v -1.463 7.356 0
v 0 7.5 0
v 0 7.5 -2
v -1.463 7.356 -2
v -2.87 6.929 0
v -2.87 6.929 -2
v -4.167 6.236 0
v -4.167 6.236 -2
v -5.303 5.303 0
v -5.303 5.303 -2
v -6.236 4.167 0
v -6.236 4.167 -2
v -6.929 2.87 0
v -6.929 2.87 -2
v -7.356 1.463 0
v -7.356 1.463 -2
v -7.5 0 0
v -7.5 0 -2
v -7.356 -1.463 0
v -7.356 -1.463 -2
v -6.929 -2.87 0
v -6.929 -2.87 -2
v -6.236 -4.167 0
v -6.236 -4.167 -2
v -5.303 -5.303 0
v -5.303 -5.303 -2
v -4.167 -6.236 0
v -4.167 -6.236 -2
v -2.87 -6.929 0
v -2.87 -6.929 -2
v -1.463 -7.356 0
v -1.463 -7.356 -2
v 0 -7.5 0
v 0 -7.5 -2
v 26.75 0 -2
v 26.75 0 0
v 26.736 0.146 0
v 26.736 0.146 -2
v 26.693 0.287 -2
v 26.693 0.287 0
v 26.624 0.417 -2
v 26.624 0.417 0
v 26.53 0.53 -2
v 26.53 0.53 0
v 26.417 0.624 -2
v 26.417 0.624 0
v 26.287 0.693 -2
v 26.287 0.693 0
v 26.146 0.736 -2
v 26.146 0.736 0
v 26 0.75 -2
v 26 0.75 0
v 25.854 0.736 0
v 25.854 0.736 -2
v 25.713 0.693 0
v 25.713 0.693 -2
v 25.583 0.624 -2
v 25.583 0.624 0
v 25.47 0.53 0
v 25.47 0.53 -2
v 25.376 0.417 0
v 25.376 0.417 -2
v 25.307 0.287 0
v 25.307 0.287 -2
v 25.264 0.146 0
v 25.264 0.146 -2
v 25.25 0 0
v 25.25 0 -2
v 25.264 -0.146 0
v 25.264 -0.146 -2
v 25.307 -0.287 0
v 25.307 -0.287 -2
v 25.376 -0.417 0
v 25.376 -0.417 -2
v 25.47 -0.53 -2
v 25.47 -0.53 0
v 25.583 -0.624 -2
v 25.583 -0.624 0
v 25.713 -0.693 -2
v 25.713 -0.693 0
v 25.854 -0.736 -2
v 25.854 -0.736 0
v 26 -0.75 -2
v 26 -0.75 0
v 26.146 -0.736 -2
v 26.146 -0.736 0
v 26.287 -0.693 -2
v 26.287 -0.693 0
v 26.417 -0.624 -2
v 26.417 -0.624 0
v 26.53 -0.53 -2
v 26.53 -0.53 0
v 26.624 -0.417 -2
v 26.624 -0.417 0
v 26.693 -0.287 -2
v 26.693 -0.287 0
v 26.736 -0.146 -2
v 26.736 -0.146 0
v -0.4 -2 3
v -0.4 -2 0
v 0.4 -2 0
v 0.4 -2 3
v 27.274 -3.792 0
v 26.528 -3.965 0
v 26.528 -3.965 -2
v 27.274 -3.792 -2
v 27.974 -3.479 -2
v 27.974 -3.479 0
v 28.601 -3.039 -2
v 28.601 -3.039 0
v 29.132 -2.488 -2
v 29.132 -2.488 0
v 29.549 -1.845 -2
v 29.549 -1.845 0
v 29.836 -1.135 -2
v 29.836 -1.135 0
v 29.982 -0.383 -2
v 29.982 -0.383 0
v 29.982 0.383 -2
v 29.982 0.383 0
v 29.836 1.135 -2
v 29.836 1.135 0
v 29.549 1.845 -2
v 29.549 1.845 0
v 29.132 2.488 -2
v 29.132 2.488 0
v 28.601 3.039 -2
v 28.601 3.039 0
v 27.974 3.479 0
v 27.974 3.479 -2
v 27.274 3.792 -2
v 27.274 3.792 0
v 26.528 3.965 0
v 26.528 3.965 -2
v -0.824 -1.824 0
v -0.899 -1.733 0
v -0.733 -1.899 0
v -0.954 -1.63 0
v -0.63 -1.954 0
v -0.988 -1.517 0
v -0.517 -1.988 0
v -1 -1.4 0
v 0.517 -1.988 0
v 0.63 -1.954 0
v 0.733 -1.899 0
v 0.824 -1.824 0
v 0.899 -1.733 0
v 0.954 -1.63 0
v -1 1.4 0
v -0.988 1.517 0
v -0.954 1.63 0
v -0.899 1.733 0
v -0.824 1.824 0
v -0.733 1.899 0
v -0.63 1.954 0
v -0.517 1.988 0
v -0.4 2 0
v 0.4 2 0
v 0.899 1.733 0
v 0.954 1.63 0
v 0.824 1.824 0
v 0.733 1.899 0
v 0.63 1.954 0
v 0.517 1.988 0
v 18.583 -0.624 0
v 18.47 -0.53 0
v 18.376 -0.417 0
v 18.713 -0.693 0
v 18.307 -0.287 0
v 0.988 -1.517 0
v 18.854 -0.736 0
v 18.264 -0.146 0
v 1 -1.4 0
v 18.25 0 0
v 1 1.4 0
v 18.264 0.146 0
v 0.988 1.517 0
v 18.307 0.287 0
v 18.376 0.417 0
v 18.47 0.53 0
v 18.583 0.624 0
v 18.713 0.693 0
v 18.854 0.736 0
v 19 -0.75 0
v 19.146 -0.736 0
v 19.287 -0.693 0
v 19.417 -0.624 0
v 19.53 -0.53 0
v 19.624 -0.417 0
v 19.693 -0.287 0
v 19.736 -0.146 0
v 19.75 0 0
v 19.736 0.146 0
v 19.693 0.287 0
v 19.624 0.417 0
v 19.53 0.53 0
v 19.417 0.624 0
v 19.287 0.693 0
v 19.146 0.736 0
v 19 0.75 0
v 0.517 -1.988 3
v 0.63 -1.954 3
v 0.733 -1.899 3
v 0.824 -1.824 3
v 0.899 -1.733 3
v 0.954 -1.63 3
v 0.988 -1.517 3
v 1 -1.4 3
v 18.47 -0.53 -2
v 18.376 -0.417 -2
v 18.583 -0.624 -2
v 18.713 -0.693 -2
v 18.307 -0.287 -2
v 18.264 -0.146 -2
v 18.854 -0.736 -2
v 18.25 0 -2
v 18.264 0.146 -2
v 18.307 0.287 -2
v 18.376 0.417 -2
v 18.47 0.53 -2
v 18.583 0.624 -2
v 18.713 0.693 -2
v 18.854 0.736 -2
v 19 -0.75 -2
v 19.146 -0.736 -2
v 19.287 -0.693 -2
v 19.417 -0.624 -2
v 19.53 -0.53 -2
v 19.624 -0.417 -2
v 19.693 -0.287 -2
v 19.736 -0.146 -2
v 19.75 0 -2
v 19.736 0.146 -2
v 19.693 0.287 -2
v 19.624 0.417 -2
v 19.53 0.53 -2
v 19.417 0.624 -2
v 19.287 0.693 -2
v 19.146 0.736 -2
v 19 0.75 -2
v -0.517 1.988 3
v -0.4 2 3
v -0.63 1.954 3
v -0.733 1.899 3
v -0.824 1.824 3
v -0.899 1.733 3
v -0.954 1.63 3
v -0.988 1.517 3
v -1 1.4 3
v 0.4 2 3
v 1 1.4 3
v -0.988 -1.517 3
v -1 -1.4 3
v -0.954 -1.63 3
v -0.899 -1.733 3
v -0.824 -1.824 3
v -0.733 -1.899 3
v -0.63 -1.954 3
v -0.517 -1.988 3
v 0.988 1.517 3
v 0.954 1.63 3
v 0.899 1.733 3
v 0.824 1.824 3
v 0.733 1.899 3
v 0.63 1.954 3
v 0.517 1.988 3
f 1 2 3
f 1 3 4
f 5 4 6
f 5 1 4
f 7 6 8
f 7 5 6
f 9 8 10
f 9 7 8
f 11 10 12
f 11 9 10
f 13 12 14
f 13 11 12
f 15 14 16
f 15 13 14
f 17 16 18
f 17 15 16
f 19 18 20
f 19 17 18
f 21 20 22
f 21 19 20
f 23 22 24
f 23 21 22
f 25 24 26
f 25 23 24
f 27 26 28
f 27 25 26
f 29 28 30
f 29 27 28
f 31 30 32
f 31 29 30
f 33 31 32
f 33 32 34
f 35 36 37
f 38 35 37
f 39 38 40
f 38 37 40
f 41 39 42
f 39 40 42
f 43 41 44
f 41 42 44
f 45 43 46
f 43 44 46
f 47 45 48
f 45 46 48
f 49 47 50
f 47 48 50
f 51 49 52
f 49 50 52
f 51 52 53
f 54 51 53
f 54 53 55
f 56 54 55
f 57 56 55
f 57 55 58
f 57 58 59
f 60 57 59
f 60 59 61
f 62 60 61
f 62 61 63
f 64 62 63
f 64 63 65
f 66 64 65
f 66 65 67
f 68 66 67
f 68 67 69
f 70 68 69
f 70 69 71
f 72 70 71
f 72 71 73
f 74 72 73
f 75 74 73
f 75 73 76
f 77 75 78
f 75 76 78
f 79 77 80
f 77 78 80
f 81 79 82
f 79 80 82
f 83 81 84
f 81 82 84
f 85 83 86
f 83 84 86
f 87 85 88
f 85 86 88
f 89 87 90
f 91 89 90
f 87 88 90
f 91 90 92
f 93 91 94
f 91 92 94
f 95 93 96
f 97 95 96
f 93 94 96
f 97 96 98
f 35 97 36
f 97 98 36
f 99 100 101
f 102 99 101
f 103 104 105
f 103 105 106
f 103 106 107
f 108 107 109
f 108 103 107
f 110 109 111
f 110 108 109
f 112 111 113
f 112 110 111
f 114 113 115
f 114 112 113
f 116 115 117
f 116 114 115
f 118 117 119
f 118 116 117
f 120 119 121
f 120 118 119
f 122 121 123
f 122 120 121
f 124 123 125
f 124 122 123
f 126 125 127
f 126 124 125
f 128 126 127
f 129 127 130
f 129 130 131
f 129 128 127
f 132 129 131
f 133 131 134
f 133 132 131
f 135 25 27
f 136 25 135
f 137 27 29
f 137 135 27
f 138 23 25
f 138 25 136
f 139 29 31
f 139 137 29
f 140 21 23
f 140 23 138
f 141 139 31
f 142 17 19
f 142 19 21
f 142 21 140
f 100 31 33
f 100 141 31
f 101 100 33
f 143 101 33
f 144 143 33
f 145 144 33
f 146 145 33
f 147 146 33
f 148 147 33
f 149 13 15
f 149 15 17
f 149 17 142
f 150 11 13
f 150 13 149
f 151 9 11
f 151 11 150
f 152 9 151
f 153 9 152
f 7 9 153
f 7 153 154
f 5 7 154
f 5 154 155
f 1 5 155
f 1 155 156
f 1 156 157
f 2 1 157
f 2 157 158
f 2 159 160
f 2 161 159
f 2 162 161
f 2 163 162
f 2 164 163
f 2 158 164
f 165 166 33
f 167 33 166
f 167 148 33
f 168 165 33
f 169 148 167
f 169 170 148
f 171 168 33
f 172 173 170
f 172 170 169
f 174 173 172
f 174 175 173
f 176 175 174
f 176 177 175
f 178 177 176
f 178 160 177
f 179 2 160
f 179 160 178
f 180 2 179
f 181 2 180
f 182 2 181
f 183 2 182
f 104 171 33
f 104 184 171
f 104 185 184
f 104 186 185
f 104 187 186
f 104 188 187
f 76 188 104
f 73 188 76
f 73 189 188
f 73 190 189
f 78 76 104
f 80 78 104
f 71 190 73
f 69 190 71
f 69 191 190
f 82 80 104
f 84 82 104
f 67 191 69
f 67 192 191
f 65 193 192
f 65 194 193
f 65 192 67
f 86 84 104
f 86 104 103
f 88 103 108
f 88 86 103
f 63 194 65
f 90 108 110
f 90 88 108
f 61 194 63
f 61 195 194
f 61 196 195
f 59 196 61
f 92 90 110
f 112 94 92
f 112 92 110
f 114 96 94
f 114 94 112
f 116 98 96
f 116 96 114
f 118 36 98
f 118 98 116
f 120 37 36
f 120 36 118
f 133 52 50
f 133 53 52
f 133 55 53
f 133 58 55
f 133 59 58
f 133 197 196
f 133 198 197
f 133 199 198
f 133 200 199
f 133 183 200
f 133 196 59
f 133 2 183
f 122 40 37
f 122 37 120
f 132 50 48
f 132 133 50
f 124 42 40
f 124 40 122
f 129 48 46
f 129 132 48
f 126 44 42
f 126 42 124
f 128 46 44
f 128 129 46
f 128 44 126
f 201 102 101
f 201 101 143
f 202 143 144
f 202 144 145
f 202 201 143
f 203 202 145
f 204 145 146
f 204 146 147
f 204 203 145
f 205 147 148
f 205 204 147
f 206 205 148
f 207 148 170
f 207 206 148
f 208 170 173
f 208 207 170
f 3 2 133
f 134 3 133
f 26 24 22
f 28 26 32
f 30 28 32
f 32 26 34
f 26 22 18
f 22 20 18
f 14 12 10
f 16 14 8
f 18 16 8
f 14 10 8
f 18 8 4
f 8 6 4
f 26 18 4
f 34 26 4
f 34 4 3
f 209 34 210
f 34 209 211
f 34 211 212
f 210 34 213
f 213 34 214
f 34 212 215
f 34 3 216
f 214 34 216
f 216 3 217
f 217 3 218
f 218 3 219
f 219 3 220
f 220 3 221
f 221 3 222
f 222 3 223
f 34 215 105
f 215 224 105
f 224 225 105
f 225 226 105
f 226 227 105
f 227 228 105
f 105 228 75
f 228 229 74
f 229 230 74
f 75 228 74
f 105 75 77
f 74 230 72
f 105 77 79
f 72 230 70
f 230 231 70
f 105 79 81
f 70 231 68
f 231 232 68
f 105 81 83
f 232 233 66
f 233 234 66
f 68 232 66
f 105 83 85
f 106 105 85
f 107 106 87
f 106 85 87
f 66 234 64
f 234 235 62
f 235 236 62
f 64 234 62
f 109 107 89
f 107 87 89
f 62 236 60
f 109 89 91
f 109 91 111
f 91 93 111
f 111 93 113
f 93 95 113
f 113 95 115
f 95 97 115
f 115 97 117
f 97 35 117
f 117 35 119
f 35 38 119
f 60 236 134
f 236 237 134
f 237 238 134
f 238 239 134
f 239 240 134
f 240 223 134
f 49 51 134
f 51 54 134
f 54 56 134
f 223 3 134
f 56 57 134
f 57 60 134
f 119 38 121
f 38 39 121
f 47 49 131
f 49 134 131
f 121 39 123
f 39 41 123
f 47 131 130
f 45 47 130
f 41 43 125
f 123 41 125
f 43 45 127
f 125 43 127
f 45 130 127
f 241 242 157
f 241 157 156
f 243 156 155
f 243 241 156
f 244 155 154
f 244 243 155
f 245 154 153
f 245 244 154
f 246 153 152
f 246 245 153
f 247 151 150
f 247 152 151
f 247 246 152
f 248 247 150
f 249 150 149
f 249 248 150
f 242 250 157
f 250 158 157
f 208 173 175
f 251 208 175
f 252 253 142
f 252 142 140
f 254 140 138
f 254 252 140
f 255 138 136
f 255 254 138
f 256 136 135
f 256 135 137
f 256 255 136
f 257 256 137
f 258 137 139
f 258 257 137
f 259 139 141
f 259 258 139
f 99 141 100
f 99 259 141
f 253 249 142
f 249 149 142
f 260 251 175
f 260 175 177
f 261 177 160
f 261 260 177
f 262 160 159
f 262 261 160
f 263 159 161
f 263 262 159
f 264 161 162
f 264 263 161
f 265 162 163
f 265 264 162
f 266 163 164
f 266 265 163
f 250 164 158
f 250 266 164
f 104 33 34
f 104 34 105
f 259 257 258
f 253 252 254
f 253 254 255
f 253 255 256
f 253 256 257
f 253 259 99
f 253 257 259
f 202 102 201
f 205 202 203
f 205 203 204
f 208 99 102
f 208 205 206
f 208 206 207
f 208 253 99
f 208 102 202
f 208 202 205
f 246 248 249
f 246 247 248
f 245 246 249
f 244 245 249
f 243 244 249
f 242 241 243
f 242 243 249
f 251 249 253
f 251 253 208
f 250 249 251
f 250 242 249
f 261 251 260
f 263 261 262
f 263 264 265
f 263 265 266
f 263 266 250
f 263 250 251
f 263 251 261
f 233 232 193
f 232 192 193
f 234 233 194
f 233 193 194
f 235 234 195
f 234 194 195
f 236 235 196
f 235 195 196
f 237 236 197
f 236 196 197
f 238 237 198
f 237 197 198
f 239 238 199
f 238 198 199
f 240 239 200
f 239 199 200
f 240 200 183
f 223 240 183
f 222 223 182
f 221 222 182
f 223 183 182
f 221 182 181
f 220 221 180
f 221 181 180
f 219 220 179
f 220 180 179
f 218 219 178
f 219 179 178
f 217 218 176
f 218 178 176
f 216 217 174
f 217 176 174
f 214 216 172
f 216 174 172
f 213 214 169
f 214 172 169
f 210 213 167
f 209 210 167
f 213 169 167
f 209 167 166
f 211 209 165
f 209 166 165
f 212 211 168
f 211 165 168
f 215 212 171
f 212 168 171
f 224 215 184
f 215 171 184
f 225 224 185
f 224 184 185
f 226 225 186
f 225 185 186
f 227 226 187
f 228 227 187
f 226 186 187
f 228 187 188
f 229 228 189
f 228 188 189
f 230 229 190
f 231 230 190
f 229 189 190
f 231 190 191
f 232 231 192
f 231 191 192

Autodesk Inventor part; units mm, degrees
ref_plane "YZ Plane" through (0, 0, 0) normal (1, 0, 0) x (0, 1, 0)
ref_plane "XZ Plane" through (0, 0, 0) normal (0, 1, 0) x (-1, 0, 0)
ref_plane "XY Plane" through (0, 0, 0) normal (0, 0, 1) x (1, 0, 0)
sketch "Szkic1" plane through (0, 0, 0) normal (0, 0, 1) x (1, 0, 0)
  circle A0 centre (0, 0) radius 7.5 construction
  line L0 (0, 7.5) -> (30, 7.5)
  line L1 (30, 7.5) -> (30, -7.5)
  line L2 (30, -7.5) -> (0, -7.5)
  line L3 (0, -7.5) -> (0, 7.5) construction
  arc A1 (0, 7.5) -> (0, -7.5) centre (0, 0) ccw
  line L4 (-1, -2) -> (1, -2)
  line L5 (1, -2) -> (1, 2)
  line L6 (1, 2) -> (-1, 2)
  line L7 (-1, 2) -> (-1, -2)
  line L8 (-1, -2) -> (1, 2) construction
  line L9 (1, -2) -> (-1, 2) construction
  circle A2 centre (26, 0) radius 4
  line L10 (-15, 0) -> (37.5, 0) construction
  line L11 (0, 7.5) -> (26.5284, 3.965)
  line L12 (0, -7.5) -> (26.5284, -3.965)
  circle A3 centre (26, 0) radius 0.75
  circle A4 centre (19, 0) radius 0.75
  point P0 (30, 0)
  dimension "d0" = 15
  dimension "d1" = 2
  dimension "d2" = 4
  dimension "d3" = 30
  dimension "d8" = 8
  dimension "d9" = 1.5
  dimension "d10" = 1.5
  dimension "d11" = 7
  dimension "d12" = 19
extrude "Wyciągnięcie proste1" add sketch "Szkic1" against normal blind 2 contours L11 A2 L12 A1 | A2 | L7 L6 L5 L4
extrude "Wyciągnięcie proste2" add sketch "Szkic1" along normal blind 3 contours L7 L6 L5 L4
fillet "Zaokrąglenie1" radius 0.6 4 edges at (-1, -2, 1.5) (1, -2, 1.5) (-1, 2, 1.5) (1, 2, 1.5)
properties part number "tweaker" material "PLA"
